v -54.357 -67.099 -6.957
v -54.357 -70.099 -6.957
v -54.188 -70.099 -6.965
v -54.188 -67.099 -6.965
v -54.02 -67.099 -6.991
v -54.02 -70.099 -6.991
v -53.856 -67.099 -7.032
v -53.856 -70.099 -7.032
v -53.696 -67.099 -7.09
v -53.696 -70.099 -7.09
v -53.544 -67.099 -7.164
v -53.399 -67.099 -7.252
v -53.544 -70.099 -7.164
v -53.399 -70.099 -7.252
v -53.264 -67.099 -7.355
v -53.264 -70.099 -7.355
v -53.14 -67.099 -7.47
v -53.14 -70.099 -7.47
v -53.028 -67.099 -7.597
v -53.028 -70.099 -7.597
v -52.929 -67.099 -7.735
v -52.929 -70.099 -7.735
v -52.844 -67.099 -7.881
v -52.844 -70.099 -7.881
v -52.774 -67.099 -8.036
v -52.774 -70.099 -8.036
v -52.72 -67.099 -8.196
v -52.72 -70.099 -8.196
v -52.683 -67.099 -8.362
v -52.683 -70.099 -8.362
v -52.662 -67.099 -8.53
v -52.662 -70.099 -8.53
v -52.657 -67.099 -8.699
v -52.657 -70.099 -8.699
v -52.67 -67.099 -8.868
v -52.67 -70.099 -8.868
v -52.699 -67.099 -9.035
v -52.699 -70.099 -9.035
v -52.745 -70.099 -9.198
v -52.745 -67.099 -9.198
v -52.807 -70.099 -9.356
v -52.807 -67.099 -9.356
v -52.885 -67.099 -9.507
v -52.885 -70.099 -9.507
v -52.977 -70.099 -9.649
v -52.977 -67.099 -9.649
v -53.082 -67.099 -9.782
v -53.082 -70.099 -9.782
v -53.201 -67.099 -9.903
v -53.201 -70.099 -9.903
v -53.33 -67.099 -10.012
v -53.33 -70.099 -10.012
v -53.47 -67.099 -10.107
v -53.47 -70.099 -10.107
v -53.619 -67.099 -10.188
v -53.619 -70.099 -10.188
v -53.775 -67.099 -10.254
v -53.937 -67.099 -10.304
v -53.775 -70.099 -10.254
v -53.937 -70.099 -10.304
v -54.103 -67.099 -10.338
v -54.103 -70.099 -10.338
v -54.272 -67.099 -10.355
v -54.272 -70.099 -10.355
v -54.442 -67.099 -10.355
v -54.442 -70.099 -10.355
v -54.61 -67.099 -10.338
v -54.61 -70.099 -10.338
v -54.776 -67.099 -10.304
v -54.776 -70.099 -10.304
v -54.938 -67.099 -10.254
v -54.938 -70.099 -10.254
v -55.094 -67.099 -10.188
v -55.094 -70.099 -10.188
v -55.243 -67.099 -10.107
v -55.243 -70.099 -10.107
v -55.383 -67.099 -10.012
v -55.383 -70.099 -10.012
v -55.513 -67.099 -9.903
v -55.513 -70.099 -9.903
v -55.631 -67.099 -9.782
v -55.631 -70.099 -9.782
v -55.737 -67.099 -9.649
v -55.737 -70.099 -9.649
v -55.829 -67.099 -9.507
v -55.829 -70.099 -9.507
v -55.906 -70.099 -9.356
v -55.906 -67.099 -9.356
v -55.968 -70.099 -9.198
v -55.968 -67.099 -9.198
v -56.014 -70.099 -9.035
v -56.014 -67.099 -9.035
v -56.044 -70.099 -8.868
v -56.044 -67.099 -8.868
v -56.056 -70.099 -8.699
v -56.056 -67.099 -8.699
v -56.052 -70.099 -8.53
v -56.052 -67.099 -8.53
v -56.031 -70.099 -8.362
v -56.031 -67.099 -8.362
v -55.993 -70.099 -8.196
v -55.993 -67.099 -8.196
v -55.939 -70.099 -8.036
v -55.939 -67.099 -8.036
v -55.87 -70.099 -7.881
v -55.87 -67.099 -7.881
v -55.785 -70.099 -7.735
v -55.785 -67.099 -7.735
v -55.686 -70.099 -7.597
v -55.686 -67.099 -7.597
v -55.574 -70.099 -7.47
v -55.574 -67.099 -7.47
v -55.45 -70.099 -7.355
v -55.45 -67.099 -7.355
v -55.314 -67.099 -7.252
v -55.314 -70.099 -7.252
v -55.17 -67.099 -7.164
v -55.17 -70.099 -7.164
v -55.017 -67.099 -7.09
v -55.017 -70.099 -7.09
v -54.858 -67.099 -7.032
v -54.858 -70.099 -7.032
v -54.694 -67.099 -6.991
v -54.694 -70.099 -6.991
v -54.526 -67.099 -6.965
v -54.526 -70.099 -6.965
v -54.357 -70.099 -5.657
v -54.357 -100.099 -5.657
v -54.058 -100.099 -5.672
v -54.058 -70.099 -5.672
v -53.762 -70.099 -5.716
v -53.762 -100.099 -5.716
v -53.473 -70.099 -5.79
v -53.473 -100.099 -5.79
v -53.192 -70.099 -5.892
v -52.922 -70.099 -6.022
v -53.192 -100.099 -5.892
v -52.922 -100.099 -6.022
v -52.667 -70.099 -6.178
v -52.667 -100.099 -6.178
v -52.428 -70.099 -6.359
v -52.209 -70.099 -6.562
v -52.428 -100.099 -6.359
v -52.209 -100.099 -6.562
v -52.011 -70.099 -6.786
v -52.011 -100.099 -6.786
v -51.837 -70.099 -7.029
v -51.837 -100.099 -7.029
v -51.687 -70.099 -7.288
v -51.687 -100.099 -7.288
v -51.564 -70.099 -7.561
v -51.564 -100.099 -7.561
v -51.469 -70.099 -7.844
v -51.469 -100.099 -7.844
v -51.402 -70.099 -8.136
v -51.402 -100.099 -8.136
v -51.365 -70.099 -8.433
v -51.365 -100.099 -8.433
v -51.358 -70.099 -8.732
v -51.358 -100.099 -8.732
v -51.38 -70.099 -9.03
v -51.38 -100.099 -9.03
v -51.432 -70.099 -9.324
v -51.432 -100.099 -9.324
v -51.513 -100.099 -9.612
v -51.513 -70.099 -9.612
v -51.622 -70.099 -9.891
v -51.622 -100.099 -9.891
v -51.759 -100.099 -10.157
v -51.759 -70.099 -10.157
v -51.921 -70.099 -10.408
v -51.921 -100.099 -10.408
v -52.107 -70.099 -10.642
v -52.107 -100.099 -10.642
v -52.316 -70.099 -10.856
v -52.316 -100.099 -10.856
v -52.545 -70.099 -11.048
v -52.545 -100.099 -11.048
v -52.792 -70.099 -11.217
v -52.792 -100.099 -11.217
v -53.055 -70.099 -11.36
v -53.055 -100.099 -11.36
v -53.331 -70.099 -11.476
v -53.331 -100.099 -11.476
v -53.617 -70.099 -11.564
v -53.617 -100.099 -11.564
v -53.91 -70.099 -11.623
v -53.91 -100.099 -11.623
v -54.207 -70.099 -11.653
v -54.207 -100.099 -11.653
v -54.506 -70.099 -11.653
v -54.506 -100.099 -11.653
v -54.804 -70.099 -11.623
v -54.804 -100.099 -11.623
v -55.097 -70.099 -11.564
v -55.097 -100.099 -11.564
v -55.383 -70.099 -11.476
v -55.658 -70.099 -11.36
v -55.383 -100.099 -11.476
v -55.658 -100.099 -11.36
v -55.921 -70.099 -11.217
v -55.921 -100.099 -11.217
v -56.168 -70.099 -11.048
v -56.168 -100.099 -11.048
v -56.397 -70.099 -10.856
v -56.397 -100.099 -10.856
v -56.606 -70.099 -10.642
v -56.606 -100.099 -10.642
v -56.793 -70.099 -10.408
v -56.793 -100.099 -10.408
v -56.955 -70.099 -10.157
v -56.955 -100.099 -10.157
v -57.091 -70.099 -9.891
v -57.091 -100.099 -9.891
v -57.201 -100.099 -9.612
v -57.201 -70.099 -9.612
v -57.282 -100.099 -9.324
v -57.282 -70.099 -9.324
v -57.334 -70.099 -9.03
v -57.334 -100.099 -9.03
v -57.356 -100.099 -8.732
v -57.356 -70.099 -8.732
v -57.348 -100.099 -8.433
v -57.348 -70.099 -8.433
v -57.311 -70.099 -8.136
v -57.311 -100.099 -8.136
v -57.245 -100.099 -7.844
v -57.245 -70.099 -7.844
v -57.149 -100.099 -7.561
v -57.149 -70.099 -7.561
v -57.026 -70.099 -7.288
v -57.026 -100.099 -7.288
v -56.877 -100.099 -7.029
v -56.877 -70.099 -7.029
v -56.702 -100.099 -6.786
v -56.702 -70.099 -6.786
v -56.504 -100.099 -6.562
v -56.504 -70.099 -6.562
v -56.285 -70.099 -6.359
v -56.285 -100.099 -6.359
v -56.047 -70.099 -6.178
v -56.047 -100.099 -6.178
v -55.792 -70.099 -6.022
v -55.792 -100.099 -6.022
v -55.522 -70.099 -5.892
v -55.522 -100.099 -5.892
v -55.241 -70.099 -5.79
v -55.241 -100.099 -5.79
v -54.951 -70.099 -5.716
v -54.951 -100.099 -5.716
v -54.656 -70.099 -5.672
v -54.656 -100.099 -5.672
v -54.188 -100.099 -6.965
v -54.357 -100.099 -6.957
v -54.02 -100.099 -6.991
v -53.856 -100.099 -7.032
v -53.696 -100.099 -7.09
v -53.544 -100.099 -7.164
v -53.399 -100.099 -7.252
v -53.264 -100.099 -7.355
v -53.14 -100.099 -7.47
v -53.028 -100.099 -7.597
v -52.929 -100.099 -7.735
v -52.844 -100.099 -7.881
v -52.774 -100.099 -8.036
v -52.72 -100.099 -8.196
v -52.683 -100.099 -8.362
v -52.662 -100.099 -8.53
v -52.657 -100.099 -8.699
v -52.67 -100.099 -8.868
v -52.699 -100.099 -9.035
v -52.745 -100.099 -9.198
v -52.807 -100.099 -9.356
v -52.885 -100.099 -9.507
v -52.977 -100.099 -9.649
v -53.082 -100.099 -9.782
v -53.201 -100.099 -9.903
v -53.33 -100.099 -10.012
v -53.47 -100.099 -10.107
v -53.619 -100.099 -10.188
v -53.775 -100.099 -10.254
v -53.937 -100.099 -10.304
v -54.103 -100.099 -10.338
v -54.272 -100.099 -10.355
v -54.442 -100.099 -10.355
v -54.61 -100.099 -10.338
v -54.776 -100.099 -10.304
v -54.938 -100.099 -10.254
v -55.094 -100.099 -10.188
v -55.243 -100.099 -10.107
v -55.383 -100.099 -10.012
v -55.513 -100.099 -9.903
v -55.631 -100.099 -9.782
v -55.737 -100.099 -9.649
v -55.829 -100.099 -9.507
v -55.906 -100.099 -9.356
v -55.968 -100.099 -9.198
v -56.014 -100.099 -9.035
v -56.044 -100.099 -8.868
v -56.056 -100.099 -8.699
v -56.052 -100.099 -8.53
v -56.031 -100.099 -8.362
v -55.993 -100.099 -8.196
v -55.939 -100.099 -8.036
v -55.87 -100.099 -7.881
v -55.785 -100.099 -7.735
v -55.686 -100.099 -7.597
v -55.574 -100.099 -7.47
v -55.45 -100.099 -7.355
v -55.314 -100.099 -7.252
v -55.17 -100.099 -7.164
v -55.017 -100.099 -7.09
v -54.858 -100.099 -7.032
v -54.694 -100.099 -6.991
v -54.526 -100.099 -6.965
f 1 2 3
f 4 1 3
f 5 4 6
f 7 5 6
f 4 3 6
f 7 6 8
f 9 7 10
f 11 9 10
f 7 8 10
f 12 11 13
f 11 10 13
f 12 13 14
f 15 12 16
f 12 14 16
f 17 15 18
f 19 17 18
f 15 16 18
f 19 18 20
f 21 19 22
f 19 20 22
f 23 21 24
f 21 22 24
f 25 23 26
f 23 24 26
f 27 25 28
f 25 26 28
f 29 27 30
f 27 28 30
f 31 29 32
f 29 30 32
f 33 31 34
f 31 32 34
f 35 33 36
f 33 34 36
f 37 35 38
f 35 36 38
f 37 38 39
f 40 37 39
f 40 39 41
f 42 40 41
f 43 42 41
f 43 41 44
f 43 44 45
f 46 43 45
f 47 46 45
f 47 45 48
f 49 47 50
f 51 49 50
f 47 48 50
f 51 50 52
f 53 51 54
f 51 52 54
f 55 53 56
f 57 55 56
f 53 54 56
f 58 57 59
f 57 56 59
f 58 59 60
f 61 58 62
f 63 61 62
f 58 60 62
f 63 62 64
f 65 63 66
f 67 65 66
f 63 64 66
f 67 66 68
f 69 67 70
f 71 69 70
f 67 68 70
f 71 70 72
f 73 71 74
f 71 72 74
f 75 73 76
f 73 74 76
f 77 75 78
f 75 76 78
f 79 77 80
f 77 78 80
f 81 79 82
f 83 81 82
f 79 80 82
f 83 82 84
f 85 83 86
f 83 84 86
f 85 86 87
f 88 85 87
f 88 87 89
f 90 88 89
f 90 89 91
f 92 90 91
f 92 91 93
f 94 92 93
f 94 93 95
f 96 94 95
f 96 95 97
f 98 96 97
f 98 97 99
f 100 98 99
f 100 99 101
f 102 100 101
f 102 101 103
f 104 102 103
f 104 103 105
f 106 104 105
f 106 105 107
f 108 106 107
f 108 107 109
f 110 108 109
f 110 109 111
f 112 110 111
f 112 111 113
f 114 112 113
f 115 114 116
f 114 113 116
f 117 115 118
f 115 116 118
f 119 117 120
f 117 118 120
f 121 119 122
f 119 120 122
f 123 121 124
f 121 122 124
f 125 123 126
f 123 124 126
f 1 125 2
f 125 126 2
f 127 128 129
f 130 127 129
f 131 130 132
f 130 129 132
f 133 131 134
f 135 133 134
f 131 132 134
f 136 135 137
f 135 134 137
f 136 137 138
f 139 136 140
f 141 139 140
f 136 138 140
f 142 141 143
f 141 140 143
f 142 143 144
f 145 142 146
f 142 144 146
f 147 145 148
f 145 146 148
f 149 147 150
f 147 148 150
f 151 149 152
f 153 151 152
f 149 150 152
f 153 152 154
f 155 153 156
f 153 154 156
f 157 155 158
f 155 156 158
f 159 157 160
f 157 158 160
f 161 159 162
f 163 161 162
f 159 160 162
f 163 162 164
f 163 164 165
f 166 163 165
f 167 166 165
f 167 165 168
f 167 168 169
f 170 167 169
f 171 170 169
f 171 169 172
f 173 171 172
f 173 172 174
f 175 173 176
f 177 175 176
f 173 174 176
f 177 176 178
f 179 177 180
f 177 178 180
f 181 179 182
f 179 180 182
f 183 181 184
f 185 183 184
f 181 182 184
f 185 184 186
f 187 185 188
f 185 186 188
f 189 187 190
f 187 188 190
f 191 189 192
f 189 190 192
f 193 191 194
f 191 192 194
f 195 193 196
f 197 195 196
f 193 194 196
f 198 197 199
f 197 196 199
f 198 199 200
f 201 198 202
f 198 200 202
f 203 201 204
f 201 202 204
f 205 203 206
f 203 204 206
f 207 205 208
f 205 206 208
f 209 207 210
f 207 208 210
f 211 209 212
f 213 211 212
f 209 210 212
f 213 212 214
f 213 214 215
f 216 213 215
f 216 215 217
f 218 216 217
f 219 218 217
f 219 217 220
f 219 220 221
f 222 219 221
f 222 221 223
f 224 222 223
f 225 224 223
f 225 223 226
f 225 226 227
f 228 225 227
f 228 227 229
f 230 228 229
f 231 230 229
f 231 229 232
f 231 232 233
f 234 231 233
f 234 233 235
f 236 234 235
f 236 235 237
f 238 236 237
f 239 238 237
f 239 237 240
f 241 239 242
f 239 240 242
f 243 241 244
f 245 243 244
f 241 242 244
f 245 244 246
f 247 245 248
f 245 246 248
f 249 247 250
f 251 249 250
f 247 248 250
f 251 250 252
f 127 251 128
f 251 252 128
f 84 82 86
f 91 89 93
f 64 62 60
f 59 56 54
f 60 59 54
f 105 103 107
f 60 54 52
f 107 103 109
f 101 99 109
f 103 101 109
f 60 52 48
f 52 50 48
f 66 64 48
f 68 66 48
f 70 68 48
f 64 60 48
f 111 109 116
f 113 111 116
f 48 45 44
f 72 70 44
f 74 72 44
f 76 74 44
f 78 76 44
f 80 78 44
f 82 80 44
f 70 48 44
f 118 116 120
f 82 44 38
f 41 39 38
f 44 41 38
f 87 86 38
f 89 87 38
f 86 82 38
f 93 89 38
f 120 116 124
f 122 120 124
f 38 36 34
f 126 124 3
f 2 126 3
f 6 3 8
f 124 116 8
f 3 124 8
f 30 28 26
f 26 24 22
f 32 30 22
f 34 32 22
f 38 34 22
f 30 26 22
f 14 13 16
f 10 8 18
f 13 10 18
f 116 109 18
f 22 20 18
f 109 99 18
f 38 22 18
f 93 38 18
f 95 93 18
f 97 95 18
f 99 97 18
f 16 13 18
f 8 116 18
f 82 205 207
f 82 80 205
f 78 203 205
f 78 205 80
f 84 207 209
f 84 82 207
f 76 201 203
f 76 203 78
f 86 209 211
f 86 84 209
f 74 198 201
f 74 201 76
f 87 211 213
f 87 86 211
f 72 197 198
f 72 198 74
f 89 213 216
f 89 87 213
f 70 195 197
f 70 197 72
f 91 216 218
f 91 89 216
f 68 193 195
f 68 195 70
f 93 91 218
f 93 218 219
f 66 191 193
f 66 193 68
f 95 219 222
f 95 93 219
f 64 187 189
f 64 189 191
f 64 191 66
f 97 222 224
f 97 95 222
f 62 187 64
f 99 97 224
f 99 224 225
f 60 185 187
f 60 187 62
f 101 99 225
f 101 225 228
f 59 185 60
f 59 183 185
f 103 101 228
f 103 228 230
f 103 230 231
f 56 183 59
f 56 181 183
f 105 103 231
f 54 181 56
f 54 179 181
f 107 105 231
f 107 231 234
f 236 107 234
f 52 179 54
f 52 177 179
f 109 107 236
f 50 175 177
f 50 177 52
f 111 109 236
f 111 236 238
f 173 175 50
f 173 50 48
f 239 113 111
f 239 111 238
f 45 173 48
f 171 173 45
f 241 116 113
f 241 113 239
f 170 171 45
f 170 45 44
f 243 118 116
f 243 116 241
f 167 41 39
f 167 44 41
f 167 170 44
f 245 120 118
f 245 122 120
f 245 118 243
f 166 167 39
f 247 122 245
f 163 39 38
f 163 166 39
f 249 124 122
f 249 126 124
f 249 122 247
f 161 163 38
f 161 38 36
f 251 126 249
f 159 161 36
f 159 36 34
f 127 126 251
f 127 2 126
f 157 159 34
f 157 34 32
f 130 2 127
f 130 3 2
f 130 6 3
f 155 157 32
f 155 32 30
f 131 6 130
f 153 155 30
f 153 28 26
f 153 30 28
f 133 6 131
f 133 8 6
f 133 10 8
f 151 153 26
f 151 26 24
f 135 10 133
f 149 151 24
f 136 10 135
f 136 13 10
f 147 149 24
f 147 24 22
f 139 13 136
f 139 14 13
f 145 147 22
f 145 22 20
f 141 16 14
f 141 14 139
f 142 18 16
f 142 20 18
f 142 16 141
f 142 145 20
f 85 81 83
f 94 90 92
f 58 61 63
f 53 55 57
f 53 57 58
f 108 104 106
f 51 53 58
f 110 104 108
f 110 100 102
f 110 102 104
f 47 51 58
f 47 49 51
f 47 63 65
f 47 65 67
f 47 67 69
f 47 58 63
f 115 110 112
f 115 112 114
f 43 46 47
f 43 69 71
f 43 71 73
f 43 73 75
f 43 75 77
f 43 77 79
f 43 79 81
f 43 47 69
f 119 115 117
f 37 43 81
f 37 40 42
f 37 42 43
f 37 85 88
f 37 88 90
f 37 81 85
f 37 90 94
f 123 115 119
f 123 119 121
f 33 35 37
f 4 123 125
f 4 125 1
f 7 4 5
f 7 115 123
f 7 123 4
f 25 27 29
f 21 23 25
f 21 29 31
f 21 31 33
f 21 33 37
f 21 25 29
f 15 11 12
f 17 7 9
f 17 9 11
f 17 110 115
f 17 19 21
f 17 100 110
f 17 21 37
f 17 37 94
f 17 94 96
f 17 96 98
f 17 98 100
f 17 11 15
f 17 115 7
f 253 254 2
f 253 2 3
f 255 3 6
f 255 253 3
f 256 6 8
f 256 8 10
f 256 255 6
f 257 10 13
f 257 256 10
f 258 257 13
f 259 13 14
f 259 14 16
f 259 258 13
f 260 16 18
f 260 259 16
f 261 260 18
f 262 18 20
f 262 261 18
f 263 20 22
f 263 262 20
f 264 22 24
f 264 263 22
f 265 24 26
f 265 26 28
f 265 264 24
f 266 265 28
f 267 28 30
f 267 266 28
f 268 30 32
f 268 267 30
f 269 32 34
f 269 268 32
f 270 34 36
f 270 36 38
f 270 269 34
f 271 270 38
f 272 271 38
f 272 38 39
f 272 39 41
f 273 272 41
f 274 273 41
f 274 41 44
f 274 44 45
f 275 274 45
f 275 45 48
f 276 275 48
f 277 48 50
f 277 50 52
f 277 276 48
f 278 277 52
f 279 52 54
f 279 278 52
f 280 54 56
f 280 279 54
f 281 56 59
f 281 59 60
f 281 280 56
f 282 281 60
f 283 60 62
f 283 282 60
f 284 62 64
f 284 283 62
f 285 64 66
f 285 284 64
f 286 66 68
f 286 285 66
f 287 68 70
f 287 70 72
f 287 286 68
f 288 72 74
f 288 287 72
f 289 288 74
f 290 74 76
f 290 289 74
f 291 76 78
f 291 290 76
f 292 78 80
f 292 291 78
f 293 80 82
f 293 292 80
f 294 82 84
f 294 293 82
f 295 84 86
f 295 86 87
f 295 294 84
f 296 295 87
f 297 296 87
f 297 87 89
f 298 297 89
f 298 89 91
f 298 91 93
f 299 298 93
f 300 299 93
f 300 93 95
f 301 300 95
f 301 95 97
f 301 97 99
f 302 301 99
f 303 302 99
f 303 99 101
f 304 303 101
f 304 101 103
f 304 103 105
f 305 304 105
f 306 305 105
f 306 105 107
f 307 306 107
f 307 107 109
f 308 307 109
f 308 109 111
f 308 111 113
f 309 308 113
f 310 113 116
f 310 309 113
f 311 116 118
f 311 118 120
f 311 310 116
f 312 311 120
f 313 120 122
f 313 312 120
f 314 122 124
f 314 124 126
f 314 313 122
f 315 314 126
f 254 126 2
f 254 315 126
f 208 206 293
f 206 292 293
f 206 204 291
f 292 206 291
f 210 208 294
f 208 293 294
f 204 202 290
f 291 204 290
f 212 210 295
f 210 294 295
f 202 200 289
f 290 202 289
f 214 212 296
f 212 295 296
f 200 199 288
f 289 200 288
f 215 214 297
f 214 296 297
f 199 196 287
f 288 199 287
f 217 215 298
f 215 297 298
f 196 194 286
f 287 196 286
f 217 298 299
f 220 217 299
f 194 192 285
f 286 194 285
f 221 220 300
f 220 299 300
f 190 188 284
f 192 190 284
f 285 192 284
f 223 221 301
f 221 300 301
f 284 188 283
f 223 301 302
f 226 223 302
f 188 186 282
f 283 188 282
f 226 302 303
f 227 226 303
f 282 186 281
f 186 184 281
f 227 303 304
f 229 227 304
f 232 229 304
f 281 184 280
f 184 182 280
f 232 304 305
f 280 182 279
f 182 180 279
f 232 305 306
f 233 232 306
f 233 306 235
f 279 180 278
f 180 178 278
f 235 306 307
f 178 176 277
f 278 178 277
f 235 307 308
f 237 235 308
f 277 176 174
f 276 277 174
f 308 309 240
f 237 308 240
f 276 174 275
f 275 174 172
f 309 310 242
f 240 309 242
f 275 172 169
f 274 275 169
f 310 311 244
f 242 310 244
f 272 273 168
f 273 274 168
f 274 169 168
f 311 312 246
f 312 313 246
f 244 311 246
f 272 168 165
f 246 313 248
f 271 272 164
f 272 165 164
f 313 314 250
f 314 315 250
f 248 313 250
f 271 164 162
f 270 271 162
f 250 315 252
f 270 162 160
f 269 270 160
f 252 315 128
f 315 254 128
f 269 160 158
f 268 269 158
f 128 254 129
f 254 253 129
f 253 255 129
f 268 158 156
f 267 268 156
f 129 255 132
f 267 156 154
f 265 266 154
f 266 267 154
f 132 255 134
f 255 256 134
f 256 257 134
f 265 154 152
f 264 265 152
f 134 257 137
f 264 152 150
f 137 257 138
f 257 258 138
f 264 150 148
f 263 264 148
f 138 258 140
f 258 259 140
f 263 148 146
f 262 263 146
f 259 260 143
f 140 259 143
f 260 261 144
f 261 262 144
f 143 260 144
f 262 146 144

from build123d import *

# Parameters (mm, degrees)
BOSS_EXTRUDE1_START = 3
SKETCH1_R           = 3
SKETCH1_R_2         = 1.7
BOSS_EXTRUDE1_DEPTH = 30
SKETCH2_R           = 1.7
BOSS_EXTRUDE2_DEPTH = 3


with BuildPart() as part:
    # Sketch1 → Boss-Extrude1 (new body)
    with BuildSketch(Plane(origin=(-72.683950256, -103.09859788, -8.697509221), x_dir=(0.9990402772046576, 0, 0.04380096486198651), z_dir=(0, 1, 0)).offset(BOSS_EXTRUDE1_START)):
        with Locations(Location((18.31133747, 0.762110226, 0), (0, 0, 272.510413577))):
            Circle(SKETCH1_R)
        with Locations(Location((18.31133747, 0.762110226, 0), (0, 0, 272.510413577))):
            Circle(SKETCH1_R_2, mode=Mode.SUBTRACT)
    extrude(amount=BOSS_EXTRUDE1_DEPTH)


with BuildPart() as body_2:
    # Sketch2 → Boss-Extrude2 (new body)
    with BuildSketch(Plane(origin=(0, -70.09859788, 0), x_dir=(1, 0, 0), z_dir=(0, 1, 0))):
        with Locations(Location((-54.356805431, 8.656833784, 0), (0, 0, 270))):
            Circle(SKETCH2_R)
    extrude(amount=BOSS_EXTRUDE2_DEPTH)


solid = Compound([part.part, body_2.part])
